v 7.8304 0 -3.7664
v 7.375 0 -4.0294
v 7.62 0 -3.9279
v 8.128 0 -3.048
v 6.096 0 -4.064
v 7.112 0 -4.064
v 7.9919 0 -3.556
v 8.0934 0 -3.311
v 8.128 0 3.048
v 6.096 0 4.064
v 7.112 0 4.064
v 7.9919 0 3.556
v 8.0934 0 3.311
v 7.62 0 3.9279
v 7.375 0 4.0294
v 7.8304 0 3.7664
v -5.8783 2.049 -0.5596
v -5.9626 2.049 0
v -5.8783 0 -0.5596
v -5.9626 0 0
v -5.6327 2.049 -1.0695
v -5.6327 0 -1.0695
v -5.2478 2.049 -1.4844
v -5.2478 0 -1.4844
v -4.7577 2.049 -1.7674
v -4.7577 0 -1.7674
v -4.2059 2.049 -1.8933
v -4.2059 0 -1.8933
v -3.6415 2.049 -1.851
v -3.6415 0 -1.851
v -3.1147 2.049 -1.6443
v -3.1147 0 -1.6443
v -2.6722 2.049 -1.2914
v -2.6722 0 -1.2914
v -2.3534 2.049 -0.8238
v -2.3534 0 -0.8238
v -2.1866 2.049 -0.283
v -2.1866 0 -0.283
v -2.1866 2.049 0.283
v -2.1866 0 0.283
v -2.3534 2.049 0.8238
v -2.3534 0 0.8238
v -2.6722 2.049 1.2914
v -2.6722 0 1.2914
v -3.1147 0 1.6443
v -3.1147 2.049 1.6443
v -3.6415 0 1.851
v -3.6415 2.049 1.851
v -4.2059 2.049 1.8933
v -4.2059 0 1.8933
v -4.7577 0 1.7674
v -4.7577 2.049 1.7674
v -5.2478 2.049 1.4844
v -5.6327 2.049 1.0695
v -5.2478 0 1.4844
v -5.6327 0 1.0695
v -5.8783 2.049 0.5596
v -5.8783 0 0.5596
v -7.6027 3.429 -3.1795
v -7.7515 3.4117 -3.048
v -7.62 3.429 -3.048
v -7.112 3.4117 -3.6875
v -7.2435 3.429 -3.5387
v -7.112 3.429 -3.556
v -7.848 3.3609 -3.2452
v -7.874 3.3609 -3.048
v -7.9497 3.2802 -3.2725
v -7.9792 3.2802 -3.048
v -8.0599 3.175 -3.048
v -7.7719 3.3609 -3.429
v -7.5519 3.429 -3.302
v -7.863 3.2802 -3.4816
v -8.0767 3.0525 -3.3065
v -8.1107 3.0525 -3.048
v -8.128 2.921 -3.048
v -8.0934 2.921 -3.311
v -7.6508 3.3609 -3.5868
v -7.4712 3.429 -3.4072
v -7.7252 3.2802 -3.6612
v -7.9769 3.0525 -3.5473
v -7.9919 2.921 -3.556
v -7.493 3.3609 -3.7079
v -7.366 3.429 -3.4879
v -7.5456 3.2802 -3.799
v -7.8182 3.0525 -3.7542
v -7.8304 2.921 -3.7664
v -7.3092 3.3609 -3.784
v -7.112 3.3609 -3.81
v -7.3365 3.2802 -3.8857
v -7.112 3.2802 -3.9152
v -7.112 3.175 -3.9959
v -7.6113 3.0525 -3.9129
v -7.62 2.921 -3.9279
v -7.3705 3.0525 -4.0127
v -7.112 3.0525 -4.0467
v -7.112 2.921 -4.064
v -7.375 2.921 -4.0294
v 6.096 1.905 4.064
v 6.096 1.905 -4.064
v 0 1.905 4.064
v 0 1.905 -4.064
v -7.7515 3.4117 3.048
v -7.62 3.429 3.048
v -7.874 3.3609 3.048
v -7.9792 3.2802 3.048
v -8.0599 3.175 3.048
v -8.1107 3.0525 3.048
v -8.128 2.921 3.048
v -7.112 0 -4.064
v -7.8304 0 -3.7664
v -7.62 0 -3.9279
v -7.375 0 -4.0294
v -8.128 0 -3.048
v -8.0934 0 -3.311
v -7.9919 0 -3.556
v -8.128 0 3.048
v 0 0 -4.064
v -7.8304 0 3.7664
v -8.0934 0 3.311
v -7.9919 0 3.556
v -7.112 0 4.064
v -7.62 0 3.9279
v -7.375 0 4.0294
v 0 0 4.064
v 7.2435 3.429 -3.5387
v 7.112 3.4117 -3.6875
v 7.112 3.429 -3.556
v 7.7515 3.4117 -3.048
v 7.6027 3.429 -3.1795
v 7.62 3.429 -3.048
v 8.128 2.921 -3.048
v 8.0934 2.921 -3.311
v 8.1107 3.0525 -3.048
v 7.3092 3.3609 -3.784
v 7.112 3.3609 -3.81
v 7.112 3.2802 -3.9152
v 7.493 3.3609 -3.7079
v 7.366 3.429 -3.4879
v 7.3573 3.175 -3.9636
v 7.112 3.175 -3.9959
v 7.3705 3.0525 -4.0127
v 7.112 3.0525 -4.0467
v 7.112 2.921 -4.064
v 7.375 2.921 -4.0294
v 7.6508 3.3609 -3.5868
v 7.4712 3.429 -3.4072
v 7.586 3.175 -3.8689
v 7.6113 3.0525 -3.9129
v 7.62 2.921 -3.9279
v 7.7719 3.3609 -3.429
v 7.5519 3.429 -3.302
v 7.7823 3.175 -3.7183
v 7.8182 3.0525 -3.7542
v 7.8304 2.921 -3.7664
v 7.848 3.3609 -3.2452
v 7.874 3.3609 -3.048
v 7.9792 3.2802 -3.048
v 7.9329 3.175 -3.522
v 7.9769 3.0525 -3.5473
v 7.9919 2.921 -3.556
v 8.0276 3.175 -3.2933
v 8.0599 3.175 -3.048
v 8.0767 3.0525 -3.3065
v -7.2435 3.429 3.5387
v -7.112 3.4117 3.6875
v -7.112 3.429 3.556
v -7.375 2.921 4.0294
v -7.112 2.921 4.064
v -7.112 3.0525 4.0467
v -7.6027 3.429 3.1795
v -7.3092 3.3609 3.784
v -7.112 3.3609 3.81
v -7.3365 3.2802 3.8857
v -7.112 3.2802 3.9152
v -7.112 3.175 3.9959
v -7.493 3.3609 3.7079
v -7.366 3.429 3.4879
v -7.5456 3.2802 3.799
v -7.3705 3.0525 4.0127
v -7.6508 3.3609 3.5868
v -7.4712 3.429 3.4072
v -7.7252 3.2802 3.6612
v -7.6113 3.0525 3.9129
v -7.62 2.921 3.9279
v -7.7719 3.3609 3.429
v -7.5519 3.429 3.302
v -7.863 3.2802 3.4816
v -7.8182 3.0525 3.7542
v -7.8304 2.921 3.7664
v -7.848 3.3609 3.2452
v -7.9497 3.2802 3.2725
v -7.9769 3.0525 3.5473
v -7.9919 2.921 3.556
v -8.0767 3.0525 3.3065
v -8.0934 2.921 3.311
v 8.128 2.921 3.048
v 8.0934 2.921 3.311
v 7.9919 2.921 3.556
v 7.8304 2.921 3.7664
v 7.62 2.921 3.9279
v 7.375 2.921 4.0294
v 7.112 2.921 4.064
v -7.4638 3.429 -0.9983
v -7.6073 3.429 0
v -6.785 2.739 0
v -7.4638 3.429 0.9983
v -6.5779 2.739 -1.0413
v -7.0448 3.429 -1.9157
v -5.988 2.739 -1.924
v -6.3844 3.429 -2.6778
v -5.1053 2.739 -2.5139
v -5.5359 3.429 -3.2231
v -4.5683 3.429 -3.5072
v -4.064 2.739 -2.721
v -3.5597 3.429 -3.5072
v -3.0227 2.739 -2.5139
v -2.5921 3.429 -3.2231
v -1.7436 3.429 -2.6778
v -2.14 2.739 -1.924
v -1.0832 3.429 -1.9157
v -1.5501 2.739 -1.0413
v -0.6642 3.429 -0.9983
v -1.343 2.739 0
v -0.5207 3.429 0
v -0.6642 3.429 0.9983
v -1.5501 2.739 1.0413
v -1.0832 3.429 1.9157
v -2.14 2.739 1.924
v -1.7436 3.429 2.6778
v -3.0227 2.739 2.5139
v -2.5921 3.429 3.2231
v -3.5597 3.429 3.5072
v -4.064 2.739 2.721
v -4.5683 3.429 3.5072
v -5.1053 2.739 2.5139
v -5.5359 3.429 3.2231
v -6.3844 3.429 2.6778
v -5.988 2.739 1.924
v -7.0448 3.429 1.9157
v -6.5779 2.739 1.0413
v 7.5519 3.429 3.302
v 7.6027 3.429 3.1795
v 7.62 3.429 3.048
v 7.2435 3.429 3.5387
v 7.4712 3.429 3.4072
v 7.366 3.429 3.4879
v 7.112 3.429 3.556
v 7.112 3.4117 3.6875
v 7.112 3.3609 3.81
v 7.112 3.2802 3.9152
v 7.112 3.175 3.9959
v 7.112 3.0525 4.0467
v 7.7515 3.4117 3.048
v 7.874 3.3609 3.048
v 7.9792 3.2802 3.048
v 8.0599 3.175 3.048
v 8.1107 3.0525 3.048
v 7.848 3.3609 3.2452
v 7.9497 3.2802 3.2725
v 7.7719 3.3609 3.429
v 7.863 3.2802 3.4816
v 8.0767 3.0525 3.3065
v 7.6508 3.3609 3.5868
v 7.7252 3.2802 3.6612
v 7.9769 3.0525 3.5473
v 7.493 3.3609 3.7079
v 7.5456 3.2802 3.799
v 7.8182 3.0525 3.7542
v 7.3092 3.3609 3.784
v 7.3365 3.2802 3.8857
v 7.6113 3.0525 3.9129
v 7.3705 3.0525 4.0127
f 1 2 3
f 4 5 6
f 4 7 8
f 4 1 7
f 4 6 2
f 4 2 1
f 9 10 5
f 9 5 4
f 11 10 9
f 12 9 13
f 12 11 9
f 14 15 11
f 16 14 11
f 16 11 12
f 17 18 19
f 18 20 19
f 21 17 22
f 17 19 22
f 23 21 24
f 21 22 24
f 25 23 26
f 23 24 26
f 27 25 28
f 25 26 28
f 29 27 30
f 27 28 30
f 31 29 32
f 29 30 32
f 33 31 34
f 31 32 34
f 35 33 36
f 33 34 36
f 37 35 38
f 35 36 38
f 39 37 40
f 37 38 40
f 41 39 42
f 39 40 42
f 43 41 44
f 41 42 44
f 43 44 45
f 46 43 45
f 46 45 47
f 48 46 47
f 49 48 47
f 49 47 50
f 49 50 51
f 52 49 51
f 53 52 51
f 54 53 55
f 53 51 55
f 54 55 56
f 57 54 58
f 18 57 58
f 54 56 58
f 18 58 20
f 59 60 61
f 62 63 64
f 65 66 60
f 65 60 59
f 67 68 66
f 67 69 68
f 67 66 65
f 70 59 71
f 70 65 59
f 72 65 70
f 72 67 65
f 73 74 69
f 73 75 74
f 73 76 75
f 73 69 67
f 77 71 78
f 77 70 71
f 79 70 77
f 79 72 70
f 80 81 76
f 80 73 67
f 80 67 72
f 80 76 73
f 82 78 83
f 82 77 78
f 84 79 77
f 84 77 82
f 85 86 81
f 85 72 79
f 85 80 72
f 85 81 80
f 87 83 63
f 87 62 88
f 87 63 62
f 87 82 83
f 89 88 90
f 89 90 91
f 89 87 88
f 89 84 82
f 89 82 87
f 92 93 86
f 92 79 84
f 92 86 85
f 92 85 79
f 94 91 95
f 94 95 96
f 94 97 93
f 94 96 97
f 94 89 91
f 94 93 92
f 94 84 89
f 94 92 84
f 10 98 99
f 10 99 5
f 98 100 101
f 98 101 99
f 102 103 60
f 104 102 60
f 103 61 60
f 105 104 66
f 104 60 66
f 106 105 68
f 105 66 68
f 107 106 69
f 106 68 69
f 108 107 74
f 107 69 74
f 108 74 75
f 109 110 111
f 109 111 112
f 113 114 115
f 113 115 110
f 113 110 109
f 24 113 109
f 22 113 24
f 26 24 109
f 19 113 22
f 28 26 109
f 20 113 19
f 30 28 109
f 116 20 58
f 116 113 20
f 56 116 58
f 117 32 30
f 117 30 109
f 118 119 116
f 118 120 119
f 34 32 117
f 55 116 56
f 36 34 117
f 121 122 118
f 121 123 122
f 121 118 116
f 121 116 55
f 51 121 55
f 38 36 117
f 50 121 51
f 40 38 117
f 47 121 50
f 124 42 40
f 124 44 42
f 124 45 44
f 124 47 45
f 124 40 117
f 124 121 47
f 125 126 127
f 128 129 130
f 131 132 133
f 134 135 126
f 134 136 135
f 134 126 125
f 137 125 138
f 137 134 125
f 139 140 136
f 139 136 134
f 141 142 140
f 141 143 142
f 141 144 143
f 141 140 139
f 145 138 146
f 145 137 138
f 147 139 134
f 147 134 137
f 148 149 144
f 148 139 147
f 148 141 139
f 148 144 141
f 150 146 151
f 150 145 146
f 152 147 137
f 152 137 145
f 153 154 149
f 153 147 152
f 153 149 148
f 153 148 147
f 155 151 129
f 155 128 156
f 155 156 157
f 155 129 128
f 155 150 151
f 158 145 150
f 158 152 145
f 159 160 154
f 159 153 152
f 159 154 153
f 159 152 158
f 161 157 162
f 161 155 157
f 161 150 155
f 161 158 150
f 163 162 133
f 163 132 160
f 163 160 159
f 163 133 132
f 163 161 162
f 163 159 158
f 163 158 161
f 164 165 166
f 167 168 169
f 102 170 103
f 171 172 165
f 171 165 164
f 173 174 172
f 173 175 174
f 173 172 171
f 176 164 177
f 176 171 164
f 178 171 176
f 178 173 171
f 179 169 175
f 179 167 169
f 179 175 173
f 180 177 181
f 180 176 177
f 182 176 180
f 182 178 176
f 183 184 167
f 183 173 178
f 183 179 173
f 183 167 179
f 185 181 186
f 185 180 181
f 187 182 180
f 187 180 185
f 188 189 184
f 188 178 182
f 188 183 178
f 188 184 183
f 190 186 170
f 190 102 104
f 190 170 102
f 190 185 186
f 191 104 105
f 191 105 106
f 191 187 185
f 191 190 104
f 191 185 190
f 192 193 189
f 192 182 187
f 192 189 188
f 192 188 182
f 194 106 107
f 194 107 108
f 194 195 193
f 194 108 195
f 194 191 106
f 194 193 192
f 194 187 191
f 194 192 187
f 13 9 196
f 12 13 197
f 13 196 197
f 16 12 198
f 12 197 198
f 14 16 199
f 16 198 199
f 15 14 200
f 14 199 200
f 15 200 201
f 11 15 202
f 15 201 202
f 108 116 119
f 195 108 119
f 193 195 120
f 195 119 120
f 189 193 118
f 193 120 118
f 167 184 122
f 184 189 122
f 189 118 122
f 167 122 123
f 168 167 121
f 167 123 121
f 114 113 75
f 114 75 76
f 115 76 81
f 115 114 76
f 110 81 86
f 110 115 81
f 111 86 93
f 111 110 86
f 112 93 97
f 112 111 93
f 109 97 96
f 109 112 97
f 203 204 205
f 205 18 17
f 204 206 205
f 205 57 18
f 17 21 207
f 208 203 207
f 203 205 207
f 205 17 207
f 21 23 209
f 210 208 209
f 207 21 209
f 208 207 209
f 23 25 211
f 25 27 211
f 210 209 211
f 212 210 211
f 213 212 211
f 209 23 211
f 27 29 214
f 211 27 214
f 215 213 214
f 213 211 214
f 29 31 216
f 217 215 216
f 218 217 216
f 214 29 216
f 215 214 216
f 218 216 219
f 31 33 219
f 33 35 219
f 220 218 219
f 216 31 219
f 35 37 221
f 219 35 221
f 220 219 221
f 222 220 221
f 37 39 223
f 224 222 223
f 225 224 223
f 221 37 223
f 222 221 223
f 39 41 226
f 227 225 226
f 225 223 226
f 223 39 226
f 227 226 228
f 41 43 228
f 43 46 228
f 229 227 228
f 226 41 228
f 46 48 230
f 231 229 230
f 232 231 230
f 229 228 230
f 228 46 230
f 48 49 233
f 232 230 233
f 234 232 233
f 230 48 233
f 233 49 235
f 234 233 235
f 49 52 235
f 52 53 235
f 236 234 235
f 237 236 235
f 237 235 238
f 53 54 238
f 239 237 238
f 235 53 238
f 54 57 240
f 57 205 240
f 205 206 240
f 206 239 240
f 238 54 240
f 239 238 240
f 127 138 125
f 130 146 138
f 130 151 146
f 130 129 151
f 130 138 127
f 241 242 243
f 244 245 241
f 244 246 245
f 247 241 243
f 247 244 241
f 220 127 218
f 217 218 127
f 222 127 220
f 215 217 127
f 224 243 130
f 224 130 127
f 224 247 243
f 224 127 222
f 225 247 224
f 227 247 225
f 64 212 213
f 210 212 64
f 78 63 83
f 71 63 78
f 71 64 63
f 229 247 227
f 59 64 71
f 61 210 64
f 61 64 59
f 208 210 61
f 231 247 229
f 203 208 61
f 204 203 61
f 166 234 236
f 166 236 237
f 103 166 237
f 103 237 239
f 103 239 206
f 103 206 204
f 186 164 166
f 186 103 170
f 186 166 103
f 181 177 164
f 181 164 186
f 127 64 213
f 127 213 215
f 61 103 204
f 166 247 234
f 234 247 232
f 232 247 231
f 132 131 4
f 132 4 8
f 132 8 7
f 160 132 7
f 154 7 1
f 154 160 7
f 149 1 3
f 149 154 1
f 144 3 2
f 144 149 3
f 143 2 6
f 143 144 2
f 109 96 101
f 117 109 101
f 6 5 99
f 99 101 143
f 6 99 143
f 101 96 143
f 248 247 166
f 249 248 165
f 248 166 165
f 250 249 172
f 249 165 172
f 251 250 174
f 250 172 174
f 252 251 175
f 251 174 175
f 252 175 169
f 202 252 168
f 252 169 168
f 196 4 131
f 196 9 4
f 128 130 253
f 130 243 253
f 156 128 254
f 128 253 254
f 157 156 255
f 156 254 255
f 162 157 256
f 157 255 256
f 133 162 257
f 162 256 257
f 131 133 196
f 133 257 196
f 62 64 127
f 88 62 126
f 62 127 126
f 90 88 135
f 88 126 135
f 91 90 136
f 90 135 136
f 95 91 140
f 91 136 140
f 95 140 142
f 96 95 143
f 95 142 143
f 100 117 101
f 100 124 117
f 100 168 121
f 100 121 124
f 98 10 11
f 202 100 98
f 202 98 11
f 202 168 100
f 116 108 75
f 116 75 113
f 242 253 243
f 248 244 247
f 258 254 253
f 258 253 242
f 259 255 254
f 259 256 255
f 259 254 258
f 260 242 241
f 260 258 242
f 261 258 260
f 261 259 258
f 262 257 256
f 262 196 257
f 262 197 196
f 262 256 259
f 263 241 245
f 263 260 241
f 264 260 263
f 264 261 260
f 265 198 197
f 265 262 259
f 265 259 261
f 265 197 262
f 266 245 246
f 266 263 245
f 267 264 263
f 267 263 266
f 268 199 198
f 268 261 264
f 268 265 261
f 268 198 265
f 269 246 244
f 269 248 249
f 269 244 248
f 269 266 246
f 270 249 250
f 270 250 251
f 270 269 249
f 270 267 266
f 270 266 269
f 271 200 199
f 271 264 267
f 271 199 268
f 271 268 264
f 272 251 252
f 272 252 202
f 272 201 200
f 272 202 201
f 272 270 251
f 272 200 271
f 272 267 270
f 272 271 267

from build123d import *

# Parameters (mm, degrees)
BOSS_EXTRUDE1_DEPTH                               = 4.064
CSK_FOR_6_FLAT_HEAD_MACHINE_SCREW_100_D           = 3.7973
CSK_FOR_6_FLAT_HEAD_MACHINE_SCREW_100_CSINK_D     = 7.0866
CSK_FOR_6_FLAT_HEAD_MACHINE_SCREW_100_CSINK_ANGLE = 100
FILLET1_R                                         = 1.016
FILLET2_R                                         = 0.508


with BuildPart() as part:
    # Sketch1 → Boss-Extrude1 (new body, symmetric)
    with BuildSketch(Plane.XY):
        Polygon((0, 0), (0, 1.905), (6.096, 1.905), (6.096, 0), (8.128, 0), (8.128, 3.429), (-8.128, 3.429), (-8.128, 0), align=None)
    extrude(amount=BOSS_EXTRUDE1_DEPTH, both=True)

    # CSK for #6 Flat Head Machine Screw (100)1 (through all)
    with Locations(Plane(origin=(0, 3.429, 0), x_dir=(1, 0, 0), z_dir=(0, 1, 0))):
        with Locations((-4.064, 0)):
            CounterSinkHole(CSK_FOR_6_FLAT_HEAD_MACHINE_SCREW_100_D / 2, CSK_FOR_6_FLAT_HEAD_MACHINE_SCREW_100_CSINK_D / 2, counter_sink_angle=CSK_FOR_6_FLAT_HEAD_MACHINE_SCREW_100_CSINK_ANGLE)

    # Fillet1
    fillet1_edges = [part.edges().sort_by_distance(p)[0] for p in [
        (-8.128, 1.7145, -4.064),
        (8.128, 1.7145, 4.064),
        (8.128, 1.7145, -4.064),
        (-8.128, 1.7145, 4.064),
    ]]
    fillet(fillet1_edges, radius=FILLET1_R)

    # Fillet2
    fillet2_edges = [part.edges().sort_by_distance(p)[0] for p in [
        (8.128, 3.429, 0),
        (0, 3.429, -4.064),
        (-8.128, 3.429, 0),
        (0, 3.429, 4.064),
        (-7.83042049, 3.429, 3.76642049),
        (-7.83042049, 3.429, -3.76642049),
        (7.83042049, 3.429, 3.76642049),
        (7.83042049, 3.429, -3.76642049),
    ]]
    fillet(fillet2_edges, radius=FILLET2_R)


solid = part.part
